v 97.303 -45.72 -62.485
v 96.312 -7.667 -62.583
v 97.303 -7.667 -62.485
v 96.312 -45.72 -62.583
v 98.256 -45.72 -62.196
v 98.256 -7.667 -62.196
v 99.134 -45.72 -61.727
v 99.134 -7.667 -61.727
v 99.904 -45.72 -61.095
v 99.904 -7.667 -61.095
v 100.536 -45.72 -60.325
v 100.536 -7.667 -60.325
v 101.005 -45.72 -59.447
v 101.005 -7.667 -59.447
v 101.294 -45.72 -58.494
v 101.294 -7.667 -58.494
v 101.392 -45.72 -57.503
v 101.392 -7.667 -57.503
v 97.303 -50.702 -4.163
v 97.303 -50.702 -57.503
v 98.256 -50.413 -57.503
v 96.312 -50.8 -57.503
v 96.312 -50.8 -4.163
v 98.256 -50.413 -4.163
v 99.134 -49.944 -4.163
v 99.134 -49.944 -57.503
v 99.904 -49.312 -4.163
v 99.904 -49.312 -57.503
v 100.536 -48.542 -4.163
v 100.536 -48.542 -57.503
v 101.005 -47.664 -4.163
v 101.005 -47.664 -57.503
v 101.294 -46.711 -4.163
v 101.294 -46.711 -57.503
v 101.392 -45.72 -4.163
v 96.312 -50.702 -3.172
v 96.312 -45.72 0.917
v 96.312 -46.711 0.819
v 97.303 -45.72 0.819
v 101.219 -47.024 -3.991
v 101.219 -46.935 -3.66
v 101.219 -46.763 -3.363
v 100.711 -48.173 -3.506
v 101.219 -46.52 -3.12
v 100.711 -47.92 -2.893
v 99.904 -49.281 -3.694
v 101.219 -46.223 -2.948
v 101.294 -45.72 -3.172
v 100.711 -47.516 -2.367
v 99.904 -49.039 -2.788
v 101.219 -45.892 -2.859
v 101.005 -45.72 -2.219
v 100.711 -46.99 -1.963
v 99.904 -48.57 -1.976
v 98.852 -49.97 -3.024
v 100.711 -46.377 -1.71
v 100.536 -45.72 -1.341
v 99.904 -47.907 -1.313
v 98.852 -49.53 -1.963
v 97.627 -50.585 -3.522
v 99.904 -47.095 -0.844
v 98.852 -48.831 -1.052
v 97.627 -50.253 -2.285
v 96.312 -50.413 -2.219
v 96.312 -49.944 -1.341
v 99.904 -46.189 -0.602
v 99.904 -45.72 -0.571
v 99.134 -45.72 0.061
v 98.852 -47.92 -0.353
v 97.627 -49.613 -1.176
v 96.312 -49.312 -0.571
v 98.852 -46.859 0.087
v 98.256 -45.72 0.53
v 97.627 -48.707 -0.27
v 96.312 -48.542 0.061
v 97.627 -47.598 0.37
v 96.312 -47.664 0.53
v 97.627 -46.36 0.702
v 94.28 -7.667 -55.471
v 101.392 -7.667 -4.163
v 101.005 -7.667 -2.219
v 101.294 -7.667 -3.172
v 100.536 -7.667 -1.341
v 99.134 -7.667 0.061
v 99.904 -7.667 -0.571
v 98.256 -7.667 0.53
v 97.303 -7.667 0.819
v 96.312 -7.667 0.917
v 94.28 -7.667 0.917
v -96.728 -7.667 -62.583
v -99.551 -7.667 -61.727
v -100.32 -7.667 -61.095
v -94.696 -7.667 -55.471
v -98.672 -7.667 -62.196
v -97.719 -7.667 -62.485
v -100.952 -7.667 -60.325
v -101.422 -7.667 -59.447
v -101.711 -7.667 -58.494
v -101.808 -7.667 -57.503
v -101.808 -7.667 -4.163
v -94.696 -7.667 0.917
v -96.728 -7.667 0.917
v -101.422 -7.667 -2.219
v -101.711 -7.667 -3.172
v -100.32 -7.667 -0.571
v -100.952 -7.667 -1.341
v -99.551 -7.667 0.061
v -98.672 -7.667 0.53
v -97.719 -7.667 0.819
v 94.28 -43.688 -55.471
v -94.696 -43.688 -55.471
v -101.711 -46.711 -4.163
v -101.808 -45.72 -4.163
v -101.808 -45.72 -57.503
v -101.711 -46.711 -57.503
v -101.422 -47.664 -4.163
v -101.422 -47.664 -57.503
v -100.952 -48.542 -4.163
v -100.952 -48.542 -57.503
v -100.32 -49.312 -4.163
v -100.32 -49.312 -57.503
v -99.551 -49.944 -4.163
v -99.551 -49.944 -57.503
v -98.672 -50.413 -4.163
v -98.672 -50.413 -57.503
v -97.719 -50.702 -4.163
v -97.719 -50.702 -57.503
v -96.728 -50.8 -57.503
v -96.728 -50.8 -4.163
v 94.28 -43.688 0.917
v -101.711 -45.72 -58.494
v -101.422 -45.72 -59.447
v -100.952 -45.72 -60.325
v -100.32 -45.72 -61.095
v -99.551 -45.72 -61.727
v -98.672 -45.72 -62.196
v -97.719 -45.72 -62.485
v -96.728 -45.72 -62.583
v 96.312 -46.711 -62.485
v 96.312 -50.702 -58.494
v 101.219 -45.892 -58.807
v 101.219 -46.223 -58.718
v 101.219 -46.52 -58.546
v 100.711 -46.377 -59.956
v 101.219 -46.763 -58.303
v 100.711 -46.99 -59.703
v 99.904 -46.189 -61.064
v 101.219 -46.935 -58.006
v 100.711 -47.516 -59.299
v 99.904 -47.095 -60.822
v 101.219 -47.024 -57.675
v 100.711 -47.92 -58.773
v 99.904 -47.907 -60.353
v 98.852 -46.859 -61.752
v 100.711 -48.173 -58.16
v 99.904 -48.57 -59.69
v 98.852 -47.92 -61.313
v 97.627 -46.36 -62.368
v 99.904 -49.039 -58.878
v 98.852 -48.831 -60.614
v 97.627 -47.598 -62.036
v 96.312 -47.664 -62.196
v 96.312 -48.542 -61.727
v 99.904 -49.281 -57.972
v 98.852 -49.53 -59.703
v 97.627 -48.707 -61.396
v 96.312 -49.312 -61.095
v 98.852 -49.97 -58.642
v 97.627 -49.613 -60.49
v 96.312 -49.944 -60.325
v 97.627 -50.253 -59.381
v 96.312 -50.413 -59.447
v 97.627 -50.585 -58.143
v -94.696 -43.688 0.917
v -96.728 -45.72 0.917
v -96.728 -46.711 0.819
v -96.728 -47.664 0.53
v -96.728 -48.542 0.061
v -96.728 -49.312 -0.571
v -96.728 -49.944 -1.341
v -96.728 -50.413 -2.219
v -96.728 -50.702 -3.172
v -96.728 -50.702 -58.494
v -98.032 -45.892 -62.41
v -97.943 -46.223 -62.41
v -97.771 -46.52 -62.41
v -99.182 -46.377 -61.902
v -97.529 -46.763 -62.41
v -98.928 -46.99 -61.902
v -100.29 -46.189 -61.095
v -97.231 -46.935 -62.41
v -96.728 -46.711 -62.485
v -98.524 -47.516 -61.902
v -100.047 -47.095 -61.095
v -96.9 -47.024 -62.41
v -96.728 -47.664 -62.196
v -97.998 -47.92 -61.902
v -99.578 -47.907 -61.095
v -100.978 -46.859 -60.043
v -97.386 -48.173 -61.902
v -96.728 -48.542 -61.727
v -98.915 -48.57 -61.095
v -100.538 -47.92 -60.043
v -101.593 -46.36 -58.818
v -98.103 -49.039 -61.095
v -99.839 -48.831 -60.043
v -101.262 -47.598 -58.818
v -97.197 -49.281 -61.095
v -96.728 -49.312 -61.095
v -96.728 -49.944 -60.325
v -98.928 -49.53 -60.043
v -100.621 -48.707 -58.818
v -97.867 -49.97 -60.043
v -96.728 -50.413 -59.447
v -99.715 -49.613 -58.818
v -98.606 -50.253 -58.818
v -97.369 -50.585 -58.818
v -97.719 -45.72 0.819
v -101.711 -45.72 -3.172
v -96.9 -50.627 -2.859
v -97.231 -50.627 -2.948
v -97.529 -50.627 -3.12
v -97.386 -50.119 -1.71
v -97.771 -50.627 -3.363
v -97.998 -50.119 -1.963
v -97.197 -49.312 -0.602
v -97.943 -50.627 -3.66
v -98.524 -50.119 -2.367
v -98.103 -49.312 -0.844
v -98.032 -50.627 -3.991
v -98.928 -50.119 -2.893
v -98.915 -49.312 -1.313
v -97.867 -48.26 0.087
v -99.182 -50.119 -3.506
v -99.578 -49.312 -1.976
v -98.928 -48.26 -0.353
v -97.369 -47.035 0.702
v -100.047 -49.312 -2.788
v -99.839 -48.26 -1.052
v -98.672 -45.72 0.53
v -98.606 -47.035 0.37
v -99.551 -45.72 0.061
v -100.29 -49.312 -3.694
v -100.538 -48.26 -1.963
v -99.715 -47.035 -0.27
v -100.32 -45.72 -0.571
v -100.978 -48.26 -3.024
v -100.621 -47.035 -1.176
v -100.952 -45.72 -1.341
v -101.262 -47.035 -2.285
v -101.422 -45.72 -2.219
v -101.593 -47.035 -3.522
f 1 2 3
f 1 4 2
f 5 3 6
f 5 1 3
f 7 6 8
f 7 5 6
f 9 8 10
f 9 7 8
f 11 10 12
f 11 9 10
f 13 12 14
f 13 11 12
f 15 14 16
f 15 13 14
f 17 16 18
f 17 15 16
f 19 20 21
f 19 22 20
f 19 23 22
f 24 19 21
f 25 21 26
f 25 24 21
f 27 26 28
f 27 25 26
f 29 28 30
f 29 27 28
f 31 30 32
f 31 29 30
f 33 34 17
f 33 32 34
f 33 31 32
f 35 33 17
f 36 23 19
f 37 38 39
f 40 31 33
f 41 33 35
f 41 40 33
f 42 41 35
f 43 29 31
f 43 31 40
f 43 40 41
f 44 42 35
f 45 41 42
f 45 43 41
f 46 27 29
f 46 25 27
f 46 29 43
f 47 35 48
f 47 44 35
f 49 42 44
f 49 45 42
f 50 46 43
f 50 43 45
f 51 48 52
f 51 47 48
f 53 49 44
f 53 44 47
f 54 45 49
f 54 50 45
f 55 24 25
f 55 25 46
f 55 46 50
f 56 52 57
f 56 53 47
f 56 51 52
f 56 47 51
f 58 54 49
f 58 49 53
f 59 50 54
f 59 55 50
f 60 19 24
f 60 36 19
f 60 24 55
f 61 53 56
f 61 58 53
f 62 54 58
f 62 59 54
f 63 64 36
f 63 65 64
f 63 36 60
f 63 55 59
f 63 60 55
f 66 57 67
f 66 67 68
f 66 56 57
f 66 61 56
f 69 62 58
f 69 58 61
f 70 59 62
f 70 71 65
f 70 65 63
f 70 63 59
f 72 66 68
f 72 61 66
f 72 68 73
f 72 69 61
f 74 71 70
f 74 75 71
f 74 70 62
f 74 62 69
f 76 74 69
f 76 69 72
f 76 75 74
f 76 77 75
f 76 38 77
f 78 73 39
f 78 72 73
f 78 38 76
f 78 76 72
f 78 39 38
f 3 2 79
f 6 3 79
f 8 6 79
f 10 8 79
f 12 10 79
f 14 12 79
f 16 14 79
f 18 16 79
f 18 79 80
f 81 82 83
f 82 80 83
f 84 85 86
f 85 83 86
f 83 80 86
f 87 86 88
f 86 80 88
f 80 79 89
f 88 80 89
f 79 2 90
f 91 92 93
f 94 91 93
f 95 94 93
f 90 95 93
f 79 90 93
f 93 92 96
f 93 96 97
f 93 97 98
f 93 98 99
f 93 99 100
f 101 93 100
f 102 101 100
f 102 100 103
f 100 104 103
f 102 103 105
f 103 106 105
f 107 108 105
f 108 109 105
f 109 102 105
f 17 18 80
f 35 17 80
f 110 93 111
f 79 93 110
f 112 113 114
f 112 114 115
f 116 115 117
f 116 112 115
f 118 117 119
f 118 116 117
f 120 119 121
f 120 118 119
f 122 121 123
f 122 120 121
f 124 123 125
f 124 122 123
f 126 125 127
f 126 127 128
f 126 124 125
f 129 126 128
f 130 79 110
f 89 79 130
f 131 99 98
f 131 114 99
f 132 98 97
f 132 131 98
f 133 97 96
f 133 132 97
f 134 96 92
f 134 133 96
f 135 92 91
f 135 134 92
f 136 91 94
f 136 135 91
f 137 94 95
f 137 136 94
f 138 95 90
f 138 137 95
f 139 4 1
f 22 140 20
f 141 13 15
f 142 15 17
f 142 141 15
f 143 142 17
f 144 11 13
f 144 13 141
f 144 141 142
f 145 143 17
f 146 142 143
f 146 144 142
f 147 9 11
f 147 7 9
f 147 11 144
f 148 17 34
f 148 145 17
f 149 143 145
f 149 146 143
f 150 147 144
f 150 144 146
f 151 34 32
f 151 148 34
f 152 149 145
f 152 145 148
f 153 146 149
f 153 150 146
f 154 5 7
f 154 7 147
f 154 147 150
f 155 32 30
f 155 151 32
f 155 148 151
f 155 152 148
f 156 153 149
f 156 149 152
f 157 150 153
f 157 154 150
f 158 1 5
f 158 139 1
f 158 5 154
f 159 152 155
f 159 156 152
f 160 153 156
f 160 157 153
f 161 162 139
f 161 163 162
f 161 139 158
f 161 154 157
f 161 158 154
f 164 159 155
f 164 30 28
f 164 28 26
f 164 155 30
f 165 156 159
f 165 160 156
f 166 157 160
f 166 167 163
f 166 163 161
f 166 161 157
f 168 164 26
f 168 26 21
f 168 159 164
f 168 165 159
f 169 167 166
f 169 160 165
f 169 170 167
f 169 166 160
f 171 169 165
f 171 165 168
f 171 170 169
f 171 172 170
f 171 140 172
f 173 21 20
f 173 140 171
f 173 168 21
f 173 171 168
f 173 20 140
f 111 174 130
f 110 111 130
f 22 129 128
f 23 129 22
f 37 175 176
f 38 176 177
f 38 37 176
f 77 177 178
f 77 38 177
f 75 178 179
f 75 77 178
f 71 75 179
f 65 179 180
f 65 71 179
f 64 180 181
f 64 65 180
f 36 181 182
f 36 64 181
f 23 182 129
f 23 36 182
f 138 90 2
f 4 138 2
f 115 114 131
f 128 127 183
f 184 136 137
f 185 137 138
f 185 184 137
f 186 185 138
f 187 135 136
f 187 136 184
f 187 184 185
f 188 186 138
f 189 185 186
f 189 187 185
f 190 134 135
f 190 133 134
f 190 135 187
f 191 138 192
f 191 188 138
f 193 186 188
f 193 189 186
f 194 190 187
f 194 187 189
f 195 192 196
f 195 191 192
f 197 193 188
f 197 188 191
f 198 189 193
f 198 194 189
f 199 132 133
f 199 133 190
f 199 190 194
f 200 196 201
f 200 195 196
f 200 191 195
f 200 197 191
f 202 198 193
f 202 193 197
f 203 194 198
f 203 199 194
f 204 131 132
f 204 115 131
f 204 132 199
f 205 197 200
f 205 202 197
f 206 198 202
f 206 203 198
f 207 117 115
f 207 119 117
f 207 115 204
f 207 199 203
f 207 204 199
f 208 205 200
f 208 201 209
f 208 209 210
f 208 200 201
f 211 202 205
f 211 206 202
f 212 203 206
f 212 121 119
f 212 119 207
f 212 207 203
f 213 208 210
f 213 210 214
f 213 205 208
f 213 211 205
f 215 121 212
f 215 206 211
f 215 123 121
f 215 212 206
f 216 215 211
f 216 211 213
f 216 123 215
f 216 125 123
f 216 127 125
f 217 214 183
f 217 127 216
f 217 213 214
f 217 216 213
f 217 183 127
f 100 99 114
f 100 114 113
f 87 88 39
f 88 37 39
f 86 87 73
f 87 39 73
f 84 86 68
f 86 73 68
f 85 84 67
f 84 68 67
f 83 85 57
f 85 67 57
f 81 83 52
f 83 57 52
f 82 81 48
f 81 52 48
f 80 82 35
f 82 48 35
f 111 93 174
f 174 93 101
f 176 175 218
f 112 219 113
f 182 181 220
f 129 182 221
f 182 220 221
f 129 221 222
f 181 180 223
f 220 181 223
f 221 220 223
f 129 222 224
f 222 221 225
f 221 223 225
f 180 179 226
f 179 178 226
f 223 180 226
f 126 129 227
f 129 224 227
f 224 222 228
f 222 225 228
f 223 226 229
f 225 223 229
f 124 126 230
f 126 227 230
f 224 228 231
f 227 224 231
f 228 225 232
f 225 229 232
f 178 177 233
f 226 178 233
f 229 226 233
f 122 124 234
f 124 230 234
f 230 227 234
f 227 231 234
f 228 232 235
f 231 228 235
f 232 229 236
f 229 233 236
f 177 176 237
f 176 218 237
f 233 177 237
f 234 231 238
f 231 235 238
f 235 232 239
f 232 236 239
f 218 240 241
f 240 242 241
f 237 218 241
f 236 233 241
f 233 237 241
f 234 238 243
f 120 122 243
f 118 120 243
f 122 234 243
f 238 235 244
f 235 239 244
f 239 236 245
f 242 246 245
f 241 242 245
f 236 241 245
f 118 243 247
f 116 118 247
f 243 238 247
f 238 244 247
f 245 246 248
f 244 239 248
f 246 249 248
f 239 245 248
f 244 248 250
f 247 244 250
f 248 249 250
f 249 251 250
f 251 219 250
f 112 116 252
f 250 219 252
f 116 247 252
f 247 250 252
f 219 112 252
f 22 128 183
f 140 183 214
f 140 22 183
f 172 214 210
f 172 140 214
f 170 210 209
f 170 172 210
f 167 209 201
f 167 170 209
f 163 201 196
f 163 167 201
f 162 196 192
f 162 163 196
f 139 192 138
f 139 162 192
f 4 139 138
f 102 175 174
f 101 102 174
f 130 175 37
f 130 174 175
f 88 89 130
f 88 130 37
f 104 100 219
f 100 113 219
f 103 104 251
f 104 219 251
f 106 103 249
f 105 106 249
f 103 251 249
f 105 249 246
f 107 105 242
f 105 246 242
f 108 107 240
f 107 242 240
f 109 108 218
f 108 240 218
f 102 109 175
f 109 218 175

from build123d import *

# Parameters (mm, degrees)
F0_W     = 203.2
F0_H     = 63.5
F1_DEPTH = 50.8
F2_T     = -7.112
F3_W     = 7.667125
F3_H     = 63.5
F4_DEPTH = 208.026
F5_R     = 5.08


with BuildPart() as f1:
    # F0 (on Front) → F1 (new body)
    with BuildSketch(Plane.XZ):
        with Locations((-0.2083, -30.832973)):
            Rectangle(F0_W, F0_H)
    extrude(amount=F1_DEPTH)

    # F2
    f2_openings = [f1.faces().sort_by_distance(p)[0] for p in [
        (-0.2083, -25.4, 0.917027),
    ]]
    offset(amount=F2_T, openings=f2_openings)

    # F3 (on face) → F4 (cut)
    with BuildSketch(Plane(origin=(-101.8083, 0, 0), x_dir=(0, -1, 0), z_dir=(-1, 0, 0))):
        with Locations((3.833562, -30.832973)):
            Rectangle(F3_W, F3_H)
    extrude(amount=-F4_DEPTH, mode=Mode.SUBTRACT)

    # F5
    f5_edges = [f1.edges().sort_by_distance(p)[0] for p in [
        (-101.8083, -29.233563, 0.917027),
        (-0.2083, -50.8, 0.917027),
        (-101.8083, -50.8, -30.832973),
        (-101.8083, -29.233563, -62.582973),
        (-0.2083, -50.8, -62.582973),
        (101.3917, -29.233563, -62.582973),
        (101.3917, -50.8, -30.832973),
        (101.3917, -29.233563, 0.917027),
    ]]
    fillet(f5_edges, radius=F5_R)


solid = f1.part
